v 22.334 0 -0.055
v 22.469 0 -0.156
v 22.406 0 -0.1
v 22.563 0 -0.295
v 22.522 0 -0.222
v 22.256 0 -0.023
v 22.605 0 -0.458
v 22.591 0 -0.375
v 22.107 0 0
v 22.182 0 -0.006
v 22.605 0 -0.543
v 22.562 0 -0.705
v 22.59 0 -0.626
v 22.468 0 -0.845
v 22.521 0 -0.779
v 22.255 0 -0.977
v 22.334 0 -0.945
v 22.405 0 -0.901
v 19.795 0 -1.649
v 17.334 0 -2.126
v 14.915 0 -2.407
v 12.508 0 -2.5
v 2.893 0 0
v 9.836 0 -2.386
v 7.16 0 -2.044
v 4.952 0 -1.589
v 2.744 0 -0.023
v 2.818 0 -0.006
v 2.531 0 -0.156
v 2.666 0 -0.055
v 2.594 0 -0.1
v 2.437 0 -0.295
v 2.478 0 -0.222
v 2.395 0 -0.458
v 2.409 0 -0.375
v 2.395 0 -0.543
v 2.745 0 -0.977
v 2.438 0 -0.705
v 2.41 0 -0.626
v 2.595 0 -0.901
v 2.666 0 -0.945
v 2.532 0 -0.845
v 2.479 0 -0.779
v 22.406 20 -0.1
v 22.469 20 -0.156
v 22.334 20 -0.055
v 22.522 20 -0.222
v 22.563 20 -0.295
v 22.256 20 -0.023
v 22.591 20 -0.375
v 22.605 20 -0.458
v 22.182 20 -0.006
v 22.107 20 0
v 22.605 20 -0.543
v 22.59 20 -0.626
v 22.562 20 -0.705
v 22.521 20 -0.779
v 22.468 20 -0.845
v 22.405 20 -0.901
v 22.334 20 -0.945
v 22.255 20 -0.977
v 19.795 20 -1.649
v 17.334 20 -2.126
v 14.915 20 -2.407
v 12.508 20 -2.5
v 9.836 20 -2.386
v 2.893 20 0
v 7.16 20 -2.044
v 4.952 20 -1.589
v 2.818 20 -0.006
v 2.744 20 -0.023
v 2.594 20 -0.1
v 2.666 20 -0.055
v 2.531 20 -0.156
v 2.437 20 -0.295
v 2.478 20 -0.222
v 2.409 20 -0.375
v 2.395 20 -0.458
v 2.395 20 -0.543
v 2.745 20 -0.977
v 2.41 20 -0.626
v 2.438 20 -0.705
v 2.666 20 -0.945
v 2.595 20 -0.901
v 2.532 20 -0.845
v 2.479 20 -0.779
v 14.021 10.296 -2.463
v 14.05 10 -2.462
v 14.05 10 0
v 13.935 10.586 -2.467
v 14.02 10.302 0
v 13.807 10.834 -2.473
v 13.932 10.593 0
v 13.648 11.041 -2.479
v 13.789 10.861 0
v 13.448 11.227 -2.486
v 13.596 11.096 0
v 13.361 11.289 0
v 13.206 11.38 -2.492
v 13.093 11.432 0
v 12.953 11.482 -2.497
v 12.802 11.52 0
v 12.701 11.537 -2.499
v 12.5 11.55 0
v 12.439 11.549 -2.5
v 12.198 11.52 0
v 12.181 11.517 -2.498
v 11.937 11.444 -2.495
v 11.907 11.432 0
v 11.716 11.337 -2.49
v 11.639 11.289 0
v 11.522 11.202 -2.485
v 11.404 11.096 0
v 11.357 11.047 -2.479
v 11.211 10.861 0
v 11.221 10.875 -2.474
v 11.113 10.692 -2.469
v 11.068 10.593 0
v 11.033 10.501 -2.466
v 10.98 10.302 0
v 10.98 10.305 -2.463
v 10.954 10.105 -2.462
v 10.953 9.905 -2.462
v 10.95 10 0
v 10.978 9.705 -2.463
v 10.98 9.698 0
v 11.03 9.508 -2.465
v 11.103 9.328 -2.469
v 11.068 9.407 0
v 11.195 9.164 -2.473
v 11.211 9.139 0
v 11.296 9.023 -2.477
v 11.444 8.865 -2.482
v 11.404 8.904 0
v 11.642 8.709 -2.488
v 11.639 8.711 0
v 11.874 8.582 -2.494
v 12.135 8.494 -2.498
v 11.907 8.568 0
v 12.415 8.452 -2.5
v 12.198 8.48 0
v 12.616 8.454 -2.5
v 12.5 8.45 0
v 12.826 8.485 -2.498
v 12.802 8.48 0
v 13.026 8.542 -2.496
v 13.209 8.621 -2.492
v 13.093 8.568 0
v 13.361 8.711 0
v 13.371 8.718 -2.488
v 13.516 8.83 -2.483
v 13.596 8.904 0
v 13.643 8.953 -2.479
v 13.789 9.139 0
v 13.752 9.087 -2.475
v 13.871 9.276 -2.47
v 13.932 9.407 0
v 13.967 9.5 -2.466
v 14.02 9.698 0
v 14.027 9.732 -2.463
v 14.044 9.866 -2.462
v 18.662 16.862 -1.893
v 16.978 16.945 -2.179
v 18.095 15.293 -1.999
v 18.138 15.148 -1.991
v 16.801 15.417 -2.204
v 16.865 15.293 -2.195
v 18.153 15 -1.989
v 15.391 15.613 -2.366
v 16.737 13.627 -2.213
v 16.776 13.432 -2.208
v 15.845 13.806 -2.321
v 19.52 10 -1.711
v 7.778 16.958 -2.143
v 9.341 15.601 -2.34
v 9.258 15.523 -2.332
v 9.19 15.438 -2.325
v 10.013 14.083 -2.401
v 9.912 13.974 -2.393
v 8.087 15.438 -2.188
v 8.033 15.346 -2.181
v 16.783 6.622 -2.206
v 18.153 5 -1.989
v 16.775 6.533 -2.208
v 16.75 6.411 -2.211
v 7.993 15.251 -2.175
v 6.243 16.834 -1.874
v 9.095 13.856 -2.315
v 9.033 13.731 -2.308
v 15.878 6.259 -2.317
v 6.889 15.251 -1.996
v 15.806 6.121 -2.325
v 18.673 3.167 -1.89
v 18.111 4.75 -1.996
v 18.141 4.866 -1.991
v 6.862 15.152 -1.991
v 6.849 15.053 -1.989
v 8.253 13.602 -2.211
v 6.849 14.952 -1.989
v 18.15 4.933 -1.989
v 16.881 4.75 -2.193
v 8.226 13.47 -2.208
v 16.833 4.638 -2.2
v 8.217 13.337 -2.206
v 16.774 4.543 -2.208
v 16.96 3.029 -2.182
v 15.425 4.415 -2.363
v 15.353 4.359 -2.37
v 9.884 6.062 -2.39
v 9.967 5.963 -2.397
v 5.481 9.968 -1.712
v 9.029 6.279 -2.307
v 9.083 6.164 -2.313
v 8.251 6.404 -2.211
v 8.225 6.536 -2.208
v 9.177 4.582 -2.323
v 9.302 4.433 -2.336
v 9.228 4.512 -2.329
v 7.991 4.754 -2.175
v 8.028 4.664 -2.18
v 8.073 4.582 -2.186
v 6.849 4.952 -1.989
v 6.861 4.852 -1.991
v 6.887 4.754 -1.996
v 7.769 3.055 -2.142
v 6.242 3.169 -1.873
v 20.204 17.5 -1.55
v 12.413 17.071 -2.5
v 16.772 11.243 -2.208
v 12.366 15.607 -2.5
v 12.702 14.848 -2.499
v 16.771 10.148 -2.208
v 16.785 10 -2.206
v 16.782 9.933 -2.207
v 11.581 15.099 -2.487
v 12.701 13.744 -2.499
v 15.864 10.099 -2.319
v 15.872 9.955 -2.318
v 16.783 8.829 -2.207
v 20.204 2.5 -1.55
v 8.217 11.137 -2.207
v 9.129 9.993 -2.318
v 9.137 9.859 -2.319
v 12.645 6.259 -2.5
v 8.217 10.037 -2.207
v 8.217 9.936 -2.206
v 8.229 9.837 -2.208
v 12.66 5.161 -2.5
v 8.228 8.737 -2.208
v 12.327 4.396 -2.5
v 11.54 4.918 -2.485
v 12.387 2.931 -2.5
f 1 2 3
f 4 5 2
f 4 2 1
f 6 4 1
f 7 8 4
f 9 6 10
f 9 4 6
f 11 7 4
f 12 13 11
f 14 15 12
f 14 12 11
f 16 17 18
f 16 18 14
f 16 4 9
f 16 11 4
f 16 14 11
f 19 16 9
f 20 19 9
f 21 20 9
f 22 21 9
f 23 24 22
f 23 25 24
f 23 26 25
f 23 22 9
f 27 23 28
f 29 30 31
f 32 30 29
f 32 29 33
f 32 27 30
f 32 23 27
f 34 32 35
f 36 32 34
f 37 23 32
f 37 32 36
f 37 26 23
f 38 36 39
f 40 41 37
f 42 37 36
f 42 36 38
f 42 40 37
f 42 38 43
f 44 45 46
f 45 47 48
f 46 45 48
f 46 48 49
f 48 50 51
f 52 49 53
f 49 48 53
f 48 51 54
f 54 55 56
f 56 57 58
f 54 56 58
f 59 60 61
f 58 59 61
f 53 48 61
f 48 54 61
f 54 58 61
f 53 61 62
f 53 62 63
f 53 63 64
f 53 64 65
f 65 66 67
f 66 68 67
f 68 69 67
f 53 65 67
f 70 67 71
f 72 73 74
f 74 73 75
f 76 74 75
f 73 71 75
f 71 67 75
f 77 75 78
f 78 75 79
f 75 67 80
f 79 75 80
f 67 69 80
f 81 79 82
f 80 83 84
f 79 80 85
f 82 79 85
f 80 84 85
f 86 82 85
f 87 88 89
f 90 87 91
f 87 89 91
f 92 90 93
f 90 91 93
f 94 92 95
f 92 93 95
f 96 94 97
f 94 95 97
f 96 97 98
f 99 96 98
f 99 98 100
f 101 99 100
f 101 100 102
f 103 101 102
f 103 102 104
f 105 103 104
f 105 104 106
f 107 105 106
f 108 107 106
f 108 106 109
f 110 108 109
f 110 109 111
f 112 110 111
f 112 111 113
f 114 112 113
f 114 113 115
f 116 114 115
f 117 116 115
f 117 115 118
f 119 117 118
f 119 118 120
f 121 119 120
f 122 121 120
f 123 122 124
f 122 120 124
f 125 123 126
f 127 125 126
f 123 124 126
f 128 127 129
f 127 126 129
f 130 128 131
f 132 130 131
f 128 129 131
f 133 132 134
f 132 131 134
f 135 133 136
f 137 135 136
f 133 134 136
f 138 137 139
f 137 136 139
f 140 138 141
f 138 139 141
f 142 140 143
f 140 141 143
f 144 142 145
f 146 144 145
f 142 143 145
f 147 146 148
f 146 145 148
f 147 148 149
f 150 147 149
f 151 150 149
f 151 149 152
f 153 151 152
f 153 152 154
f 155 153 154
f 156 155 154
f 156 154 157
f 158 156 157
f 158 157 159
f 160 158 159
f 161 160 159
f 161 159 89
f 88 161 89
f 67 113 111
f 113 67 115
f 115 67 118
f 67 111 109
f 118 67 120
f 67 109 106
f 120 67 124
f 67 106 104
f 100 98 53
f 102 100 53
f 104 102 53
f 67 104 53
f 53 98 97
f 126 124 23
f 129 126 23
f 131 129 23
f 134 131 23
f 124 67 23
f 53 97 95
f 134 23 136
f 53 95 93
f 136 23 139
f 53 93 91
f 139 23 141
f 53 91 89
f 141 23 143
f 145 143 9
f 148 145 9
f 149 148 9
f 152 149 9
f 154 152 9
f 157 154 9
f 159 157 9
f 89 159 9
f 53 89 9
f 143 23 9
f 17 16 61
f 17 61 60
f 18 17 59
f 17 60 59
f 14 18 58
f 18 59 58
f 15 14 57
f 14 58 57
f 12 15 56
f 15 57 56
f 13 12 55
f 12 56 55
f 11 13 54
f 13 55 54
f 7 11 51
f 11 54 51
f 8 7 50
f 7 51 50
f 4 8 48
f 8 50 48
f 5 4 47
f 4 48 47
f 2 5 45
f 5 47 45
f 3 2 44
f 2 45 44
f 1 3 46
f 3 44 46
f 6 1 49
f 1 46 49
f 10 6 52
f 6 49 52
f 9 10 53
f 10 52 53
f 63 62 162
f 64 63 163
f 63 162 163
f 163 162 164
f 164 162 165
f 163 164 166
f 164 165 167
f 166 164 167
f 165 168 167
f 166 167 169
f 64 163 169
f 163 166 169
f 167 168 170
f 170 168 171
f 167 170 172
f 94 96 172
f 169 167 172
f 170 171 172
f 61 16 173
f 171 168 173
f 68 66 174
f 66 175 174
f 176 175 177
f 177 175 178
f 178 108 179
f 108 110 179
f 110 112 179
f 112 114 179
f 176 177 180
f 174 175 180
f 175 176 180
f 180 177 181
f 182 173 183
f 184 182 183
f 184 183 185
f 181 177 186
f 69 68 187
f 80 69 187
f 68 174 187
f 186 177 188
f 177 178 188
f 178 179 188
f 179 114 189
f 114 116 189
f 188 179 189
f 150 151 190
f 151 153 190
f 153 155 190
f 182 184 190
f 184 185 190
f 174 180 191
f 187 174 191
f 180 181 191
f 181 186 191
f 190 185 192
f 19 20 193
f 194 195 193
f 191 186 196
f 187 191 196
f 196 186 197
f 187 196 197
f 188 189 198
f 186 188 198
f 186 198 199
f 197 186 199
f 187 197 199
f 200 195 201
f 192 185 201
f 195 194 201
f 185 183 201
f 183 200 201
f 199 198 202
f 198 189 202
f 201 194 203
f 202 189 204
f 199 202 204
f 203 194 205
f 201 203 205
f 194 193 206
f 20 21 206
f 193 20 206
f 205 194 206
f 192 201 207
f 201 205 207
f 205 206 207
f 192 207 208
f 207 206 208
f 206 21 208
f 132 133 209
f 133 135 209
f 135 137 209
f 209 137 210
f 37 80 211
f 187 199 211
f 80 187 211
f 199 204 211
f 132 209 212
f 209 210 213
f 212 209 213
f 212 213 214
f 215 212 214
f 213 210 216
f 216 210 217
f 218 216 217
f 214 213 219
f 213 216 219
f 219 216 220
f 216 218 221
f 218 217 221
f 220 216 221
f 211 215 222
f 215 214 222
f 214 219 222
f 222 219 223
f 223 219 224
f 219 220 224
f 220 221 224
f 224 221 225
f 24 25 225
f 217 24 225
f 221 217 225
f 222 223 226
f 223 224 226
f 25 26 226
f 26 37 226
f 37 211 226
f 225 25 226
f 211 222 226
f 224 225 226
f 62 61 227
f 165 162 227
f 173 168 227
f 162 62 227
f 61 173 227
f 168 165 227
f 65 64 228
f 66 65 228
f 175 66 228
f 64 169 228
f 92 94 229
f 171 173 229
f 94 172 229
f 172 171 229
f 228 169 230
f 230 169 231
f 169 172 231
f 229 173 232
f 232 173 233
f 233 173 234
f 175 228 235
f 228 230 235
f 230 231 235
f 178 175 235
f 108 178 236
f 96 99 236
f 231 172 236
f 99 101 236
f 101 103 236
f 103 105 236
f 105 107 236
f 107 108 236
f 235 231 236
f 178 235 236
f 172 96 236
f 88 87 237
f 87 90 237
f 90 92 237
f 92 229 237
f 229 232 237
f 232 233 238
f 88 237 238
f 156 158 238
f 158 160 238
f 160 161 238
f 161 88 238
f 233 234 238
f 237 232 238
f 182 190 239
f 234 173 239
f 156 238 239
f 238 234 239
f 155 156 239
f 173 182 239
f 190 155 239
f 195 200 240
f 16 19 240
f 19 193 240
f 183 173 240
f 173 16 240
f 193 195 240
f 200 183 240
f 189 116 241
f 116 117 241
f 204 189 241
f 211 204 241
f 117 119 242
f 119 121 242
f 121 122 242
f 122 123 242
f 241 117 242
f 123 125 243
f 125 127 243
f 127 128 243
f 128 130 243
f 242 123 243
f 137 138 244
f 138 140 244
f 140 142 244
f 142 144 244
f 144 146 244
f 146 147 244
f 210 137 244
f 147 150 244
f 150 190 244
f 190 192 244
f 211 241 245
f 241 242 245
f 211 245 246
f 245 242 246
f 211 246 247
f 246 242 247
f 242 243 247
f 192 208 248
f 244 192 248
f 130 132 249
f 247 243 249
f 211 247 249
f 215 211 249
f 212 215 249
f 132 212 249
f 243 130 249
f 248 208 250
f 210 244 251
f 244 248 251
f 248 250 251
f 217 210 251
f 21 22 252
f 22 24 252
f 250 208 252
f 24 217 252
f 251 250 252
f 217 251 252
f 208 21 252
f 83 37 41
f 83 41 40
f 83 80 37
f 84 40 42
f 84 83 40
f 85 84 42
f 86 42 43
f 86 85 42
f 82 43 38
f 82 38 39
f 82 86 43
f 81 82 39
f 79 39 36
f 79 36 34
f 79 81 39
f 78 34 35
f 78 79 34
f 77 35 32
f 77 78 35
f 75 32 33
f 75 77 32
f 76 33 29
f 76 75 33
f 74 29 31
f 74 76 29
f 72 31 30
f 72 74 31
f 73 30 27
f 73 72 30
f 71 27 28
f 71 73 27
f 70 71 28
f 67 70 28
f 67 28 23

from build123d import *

# Parameters (mm, degrees)
BOSS_EXTRUDE1_DEPTH = 20
SKETCH2_R           = 1.55
CUT_EXTRUDE1_DEPTH  = 20
FILLET1_R           = 0.5


with BuildPart() as part:
    # Sketch1 → Boss-Extrude1 (new body)
    with BuildSketch(Plane(origin=(0, 0, 0), x_dir=(1, 0, 0), z_dir=(0, 1, 0))):
        with BuildLine():
            add(Edge.make_bspline(
                [(0, 0), (6.25, 2.5), (12.5, 2.5)],
                knots=[0, 0, 0, 0.5, 0.5, 0.5], degree=2))
            Line((0, 0), (12.5, 0))
            Line((12.5, 0), (12.5, 2.5))
        make_face()
        with BuildLine():
            Line((12.5, 2.5), (12.5, 0))
            Line((12.5, 0), (25, 0))
            add(Edge.make_bspline(
                [(12.5, 2.5), (18.75, 2.5), (25, 0)],
                knots=[0.5, 0.5, 0.5, 1, 1, 1], degree=2))
        make_face()
    extrude(amount=BOSS_EXTRUDE1_DEPTH)

    # Sketch2 → Cut-Extrude1 (cut)
    with BuildSketch(Plane.XY):
        with Locations((12.5, 10)):
            Circle(SKETCH2_R)
    extrude(amount=-CUT_EXTRUDE1_DEPTH, mode=Mode.SUBTRACT)

    # Fillet1
    fillet1_edges = [part.edges().sort_by_distance(p)[0] for p in [
        (0, 10, 0),
        (25, 10, 0),
    ]]
    fillet(fillet1_edges, radius=FILLET1_R)


solid = part.part
